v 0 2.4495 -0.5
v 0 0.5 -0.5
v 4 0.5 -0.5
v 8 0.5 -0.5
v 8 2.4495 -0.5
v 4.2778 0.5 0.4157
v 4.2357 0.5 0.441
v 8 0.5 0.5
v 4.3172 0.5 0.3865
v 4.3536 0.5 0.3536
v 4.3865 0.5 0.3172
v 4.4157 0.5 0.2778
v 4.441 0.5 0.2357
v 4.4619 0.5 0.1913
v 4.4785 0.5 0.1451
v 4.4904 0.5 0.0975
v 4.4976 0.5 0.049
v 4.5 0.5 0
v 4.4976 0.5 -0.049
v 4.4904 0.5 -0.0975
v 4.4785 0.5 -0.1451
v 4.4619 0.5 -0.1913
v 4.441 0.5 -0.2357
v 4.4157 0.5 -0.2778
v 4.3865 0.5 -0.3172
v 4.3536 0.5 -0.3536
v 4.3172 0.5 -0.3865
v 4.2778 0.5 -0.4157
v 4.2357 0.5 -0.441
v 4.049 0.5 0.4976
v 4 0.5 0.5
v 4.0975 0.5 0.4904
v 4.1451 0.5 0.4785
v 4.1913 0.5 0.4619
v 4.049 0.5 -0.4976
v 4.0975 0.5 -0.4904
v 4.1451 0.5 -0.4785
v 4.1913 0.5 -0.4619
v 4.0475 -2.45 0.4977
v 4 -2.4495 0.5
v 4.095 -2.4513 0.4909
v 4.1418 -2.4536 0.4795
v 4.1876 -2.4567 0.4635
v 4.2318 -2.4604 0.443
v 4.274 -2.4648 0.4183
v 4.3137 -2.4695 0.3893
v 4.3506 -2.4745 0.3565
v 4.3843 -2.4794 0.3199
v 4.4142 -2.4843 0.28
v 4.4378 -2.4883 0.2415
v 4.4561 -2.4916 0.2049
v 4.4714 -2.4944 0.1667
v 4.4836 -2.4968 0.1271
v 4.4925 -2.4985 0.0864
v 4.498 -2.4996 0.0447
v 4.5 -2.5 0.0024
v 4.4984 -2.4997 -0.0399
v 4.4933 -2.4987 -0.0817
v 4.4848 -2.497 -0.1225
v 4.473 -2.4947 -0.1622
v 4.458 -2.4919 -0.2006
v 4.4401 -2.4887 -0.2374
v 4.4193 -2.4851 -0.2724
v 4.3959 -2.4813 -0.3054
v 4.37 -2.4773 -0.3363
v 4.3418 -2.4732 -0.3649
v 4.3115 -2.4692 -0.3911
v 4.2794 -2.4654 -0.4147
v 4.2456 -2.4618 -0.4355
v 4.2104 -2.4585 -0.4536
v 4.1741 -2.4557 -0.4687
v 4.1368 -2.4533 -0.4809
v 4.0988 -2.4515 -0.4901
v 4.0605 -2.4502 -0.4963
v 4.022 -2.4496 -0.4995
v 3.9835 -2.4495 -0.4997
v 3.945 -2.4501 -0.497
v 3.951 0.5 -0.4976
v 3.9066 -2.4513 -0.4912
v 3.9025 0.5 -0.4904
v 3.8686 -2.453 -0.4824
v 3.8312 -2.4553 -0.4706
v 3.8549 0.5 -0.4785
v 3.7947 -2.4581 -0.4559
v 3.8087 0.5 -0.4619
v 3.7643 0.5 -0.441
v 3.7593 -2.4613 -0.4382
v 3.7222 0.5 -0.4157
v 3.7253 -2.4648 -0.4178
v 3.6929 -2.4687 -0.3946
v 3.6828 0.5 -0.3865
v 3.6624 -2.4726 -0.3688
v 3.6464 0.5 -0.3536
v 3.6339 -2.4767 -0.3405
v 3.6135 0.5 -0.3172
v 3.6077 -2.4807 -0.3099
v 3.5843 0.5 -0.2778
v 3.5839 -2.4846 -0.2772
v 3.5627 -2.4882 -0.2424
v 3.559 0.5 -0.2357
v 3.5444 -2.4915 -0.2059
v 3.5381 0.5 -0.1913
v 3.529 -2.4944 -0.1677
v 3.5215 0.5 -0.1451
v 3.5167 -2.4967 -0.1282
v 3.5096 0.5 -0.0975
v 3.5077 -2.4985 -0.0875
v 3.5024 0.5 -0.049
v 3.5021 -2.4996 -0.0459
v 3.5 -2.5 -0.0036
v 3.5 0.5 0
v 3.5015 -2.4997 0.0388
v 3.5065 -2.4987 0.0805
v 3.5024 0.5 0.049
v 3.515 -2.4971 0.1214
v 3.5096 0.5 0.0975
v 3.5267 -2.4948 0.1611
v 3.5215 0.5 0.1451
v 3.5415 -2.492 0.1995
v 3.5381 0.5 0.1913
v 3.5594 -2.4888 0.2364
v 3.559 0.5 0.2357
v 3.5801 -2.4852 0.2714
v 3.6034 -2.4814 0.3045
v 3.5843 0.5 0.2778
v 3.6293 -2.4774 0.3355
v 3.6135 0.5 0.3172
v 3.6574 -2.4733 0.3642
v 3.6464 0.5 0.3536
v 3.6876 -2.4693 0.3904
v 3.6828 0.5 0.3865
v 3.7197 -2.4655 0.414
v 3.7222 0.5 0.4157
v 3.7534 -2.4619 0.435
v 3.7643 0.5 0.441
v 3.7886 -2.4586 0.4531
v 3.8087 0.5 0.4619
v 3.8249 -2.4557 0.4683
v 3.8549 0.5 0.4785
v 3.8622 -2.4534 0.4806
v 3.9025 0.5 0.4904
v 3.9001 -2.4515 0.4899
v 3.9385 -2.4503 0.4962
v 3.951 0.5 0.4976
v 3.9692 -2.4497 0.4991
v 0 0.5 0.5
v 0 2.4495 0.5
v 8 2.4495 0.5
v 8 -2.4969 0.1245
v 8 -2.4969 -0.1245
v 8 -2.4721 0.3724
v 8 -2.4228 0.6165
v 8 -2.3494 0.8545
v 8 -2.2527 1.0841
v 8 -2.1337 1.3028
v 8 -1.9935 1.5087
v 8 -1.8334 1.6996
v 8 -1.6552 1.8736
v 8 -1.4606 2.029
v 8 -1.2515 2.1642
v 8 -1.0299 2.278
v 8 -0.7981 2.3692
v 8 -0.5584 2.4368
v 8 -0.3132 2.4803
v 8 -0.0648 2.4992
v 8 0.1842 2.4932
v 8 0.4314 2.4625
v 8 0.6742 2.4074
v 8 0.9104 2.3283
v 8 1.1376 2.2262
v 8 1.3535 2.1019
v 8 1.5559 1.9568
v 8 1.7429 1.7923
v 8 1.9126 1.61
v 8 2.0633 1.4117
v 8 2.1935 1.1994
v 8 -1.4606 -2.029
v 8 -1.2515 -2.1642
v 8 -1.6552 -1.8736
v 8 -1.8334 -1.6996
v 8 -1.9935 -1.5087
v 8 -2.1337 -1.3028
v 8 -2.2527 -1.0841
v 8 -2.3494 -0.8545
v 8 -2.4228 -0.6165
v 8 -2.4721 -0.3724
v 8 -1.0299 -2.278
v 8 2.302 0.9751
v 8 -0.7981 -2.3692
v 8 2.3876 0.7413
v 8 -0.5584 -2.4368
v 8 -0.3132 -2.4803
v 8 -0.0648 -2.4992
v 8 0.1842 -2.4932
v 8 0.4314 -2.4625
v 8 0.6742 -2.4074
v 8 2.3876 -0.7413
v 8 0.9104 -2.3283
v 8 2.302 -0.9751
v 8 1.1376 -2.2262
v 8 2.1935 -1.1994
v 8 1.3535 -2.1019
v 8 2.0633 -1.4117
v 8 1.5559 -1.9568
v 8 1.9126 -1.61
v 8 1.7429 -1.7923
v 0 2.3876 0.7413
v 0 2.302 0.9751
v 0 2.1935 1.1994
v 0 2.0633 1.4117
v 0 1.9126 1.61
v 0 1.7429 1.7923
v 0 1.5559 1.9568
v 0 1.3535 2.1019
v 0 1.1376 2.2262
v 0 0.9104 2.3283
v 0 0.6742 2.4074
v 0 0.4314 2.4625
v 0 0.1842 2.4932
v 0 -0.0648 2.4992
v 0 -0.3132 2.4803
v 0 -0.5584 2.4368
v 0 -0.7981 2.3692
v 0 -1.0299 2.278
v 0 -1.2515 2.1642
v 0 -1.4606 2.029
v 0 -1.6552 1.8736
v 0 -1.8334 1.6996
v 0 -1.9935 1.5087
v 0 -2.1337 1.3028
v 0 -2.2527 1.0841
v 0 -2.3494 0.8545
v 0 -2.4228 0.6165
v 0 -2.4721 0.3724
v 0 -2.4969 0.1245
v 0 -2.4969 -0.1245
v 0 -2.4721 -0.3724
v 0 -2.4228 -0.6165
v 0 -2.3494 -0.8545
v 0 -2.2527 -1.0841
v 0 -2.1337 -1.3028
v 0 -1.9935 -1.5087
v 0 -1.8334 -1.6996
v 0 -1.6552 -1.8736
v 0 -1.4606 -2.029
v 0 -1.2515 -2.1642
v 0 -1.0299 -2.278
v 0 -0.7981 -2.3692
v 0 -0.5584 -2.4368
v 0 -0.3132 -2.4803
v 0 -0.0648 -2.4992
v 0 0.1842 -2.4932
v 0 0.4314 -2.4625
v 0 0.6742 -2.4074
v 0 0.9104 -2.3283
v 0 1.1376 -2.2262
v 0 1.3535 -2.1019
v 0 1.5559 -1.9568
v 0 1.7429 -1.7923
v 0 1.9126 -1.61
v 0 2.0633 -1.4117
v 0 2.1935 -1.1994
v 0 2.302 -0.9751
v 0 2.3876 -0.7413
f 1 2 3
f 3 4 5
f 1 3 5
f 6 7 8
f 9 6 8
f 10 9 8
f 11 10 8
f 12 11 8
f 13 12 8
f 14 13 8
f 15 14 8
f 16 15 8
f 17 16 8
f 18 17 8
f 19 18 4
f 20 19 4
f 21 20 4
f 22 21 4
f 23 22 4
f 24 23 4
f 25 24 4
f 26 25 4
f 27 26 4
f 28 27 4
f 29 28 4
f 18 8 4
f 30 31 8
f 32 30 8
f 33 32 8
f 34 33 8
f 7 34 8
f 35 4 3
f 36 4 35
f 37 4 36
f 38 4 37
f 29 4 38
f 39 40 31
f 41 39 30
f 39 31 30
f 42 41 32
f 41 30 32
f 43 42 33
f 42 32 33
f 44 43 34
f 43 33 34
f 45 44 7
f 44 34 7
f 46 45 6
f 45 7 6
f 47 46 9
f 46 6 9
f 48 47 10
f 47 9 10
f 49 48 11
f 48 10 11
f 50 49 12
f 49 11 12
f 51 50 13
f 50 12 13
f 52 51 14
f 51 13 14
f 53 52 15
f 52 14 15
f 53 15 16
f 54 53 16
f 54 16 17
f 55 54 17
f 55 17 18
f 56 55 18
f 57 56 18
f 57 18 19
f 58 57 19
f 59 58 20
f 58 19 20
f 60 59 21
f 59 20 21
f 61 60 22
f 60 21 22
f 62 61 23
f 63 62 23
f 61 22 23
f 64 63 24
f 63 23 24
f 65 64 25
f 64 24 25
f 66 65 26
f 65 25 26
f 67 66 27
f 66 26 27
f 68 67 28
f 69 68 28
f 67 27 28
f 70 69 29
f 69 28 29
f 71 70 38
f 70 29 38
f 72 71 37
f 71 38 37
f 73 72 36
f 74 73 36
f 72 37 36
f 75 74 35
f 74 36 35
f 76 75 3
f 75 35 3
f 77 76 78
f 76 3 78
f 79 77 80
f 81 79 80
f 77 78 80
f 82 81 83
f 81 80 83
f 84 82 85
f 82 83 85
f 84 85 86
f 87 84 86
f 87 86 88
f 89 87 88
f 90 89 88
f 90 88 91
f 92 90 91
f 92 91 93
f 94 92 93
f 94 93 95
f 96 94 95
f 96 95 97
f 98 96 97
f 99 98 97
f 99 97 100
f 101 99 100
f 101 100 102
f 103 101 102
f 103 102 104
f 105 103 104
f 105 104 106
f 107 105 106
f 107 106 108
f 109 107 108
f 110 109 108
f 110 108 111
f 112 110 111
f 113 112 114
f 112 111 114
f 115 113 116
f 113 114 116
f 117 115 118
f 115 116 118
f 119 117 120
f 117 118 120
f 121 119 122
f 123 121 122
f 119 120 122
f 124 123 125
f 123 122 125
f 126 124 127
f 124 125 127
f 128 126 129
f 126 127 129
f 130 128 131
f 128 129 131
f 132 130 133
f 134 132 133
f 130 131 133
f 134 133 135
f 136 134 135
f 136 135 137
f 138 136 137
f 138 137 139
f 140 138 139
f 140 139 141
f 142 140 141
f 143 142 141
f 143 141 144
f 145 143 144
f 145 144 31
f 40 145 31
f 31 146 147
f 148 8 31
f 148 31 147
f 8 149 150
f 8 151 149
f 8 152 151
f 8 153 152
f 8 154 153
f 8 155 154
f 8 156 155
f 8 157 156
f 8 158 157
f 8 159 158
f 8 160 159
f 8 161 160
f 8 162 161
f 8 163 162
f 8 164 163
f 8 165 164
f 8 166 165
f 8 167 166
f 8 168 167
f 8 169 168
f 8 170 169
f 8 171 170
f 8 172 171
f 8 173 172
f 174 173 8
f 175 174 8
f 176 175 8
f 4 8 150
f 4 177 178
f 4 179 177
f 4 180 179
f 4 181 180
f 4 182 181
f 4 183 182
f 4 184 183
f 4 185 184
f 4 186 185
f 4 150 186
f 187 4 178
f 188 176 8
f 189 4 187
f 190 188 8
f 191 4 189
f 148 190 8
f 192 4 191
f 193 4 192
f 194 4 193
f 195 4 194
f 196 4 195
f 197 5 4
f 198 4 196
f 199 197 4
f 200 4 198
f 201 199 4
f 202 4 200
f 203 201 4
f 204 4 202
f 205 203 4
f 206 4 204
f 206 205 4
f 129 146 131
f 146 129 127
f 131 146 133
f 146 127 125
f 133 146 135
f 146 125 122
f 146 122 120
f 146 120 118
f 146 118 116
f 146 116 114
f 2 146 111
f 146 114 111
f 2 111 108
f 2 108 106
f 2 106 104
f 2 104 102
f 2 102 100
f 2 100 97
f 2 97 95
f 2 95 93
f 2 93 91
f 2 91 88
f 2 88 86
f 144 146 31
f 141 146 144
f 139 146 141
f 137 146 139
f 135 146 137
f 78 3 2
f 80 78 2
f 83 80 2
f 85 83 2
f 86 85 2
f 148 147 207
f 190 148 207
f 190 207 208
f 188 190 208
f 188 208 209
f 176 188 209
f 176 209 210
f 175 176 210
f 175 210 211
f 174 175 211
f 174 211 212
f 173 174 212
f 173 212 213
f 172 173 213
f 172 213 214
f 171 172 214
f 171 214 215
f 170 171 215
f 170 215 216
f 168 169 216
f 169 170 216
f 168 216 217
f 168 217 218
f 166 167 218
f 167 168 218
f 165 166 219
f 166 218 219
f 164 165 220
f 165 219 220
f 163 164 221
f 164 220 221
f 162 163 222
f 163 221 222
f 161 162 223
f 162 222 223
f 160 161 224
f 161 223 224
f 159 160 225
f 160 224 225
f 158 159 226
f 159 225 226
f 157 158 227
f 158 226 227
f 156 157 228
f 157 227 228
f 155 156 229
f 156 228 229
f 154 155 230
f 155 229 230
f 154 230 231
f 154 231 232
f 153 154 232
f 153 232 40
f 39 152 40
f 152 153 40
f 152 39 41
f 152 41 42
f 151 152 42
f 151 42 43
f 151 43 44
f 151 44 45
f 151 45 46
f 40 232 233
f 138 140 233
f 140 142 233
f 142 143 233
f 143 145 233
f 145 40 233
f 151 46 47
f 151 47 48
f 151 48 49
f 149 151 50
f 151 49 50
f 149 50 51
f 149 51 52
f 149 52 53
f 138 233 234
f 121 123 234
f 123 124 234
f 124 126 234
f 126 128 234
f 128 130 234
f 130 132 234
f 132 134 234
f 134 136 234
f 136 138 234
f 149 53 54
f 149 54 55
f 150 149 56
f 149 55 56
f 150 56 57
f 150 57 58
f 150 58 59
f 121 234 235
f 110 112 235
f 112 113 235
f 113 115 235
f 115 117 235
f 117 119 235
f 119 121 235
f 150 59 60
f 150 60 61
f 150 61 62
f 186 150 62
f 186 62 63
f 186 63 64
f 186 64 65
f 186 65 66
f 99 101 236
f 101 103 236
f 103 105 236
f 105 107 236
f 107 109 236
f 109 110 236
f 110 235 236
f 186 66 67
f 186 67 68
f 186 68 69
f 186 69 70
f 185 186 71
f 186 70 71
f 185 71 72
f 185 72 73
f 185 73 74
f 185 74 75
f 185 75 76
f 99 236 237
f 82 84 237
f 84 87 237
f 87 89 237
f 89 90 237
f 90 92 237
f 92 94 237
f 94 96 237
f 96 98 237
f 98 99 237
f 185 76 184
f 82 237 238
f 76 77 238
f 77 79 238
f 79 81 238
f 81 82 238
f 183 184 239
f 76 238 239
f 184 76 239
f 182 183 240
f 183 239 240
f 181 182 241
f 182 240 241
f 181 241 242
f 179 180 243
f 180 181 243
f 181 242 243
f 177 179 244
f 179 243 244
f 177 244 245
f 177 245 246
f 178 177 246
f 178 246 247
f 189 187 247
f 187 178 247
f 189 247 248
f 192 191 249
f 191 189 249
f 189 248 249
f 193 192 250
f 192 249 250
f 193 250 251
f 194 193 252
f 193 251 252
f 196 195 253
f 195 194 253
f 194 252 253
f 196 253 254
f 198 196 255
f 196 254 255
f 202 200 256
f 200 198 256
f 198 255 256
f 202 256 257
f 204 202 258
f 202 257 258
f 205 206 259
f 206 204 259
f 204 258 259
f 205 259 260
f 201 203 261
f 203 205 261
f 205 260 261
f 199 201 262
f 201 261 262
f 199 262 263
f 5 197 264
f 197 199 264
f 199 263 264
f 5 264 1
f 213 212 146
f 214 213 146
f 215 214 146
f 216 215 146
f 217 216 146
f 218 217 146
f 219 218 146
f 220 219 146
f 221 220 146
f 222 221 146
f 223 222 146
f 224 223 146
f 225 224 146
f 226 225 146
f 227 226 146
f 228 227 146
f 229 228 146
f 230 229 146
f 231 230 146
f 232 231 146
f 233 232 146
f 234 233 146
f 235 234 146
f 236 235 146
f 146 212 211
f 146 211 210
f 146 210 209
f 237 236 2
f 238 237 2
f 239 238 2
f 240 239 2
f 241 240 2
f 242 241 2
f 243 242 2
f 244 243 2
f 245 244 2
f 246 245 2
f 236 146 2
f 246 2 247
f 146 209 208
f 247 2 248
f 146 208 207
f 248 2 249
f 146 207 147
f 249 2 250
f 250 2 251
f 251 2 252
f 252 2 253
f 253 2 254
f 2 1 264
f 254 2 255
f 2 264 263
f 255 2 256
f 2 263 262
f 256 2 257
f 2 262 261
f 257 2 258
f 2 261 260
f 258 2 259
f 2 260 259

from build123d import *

# Parameters (mm, degrees)
SKETCH_1_R          = 2.5
EXTRUDE_1_DEPTH     = 8
SKETCH_2_R          = 0.5
CUT_EXTRUDE_2_DEPTH = 4
SKETCH_3_W          = 1
SKETCH_3_H          = 4
CUT_EXTRUDE_3_DEPTH = 8


with BuildPart() as part:
    # 草图1 → 凸台-拉伸1 (new body)
    with BuildSketch(Plane(origin=(0, 0, 0), x_dir=(0, 0, -1), z_dir=(1, 0, 0))):
        Circle(SKETCH_1_R)
    extrude(amount=EXTRUDE_1_DEPTH)

    # 草图2 → 切除-拉伸2 (cut, symmetric)
    with BuildSketch(Plane(origin=(0, 0, 0), x_dir=(1, 0, 0), z_dir=(0, 1, 0))):
        with Locations(Location((4, 0, 0), (0, 0, 270))):
            Circle(SKETCH_2_R)
    extrude(amount=CUT_EXTRUDE_2_DEPTH, both=True, mode=Mode.SUBTRACT)

    # 草图3 → 切除-拉伸3 (cut)
    with BuildSketch(Plane(origin=(8, 0, 0), x_dir=(0, 0, -1), z_dir=(1, 0, 0))):
        with Locations((0, 2.5)):
            Rectangle(SKETCH_3_W, SKETCH_3_H)
    extrude(amount=-CUT_EXTRUDE_3_DEPTH, mode=Mode.SUBTRACT)


solid = part.part
